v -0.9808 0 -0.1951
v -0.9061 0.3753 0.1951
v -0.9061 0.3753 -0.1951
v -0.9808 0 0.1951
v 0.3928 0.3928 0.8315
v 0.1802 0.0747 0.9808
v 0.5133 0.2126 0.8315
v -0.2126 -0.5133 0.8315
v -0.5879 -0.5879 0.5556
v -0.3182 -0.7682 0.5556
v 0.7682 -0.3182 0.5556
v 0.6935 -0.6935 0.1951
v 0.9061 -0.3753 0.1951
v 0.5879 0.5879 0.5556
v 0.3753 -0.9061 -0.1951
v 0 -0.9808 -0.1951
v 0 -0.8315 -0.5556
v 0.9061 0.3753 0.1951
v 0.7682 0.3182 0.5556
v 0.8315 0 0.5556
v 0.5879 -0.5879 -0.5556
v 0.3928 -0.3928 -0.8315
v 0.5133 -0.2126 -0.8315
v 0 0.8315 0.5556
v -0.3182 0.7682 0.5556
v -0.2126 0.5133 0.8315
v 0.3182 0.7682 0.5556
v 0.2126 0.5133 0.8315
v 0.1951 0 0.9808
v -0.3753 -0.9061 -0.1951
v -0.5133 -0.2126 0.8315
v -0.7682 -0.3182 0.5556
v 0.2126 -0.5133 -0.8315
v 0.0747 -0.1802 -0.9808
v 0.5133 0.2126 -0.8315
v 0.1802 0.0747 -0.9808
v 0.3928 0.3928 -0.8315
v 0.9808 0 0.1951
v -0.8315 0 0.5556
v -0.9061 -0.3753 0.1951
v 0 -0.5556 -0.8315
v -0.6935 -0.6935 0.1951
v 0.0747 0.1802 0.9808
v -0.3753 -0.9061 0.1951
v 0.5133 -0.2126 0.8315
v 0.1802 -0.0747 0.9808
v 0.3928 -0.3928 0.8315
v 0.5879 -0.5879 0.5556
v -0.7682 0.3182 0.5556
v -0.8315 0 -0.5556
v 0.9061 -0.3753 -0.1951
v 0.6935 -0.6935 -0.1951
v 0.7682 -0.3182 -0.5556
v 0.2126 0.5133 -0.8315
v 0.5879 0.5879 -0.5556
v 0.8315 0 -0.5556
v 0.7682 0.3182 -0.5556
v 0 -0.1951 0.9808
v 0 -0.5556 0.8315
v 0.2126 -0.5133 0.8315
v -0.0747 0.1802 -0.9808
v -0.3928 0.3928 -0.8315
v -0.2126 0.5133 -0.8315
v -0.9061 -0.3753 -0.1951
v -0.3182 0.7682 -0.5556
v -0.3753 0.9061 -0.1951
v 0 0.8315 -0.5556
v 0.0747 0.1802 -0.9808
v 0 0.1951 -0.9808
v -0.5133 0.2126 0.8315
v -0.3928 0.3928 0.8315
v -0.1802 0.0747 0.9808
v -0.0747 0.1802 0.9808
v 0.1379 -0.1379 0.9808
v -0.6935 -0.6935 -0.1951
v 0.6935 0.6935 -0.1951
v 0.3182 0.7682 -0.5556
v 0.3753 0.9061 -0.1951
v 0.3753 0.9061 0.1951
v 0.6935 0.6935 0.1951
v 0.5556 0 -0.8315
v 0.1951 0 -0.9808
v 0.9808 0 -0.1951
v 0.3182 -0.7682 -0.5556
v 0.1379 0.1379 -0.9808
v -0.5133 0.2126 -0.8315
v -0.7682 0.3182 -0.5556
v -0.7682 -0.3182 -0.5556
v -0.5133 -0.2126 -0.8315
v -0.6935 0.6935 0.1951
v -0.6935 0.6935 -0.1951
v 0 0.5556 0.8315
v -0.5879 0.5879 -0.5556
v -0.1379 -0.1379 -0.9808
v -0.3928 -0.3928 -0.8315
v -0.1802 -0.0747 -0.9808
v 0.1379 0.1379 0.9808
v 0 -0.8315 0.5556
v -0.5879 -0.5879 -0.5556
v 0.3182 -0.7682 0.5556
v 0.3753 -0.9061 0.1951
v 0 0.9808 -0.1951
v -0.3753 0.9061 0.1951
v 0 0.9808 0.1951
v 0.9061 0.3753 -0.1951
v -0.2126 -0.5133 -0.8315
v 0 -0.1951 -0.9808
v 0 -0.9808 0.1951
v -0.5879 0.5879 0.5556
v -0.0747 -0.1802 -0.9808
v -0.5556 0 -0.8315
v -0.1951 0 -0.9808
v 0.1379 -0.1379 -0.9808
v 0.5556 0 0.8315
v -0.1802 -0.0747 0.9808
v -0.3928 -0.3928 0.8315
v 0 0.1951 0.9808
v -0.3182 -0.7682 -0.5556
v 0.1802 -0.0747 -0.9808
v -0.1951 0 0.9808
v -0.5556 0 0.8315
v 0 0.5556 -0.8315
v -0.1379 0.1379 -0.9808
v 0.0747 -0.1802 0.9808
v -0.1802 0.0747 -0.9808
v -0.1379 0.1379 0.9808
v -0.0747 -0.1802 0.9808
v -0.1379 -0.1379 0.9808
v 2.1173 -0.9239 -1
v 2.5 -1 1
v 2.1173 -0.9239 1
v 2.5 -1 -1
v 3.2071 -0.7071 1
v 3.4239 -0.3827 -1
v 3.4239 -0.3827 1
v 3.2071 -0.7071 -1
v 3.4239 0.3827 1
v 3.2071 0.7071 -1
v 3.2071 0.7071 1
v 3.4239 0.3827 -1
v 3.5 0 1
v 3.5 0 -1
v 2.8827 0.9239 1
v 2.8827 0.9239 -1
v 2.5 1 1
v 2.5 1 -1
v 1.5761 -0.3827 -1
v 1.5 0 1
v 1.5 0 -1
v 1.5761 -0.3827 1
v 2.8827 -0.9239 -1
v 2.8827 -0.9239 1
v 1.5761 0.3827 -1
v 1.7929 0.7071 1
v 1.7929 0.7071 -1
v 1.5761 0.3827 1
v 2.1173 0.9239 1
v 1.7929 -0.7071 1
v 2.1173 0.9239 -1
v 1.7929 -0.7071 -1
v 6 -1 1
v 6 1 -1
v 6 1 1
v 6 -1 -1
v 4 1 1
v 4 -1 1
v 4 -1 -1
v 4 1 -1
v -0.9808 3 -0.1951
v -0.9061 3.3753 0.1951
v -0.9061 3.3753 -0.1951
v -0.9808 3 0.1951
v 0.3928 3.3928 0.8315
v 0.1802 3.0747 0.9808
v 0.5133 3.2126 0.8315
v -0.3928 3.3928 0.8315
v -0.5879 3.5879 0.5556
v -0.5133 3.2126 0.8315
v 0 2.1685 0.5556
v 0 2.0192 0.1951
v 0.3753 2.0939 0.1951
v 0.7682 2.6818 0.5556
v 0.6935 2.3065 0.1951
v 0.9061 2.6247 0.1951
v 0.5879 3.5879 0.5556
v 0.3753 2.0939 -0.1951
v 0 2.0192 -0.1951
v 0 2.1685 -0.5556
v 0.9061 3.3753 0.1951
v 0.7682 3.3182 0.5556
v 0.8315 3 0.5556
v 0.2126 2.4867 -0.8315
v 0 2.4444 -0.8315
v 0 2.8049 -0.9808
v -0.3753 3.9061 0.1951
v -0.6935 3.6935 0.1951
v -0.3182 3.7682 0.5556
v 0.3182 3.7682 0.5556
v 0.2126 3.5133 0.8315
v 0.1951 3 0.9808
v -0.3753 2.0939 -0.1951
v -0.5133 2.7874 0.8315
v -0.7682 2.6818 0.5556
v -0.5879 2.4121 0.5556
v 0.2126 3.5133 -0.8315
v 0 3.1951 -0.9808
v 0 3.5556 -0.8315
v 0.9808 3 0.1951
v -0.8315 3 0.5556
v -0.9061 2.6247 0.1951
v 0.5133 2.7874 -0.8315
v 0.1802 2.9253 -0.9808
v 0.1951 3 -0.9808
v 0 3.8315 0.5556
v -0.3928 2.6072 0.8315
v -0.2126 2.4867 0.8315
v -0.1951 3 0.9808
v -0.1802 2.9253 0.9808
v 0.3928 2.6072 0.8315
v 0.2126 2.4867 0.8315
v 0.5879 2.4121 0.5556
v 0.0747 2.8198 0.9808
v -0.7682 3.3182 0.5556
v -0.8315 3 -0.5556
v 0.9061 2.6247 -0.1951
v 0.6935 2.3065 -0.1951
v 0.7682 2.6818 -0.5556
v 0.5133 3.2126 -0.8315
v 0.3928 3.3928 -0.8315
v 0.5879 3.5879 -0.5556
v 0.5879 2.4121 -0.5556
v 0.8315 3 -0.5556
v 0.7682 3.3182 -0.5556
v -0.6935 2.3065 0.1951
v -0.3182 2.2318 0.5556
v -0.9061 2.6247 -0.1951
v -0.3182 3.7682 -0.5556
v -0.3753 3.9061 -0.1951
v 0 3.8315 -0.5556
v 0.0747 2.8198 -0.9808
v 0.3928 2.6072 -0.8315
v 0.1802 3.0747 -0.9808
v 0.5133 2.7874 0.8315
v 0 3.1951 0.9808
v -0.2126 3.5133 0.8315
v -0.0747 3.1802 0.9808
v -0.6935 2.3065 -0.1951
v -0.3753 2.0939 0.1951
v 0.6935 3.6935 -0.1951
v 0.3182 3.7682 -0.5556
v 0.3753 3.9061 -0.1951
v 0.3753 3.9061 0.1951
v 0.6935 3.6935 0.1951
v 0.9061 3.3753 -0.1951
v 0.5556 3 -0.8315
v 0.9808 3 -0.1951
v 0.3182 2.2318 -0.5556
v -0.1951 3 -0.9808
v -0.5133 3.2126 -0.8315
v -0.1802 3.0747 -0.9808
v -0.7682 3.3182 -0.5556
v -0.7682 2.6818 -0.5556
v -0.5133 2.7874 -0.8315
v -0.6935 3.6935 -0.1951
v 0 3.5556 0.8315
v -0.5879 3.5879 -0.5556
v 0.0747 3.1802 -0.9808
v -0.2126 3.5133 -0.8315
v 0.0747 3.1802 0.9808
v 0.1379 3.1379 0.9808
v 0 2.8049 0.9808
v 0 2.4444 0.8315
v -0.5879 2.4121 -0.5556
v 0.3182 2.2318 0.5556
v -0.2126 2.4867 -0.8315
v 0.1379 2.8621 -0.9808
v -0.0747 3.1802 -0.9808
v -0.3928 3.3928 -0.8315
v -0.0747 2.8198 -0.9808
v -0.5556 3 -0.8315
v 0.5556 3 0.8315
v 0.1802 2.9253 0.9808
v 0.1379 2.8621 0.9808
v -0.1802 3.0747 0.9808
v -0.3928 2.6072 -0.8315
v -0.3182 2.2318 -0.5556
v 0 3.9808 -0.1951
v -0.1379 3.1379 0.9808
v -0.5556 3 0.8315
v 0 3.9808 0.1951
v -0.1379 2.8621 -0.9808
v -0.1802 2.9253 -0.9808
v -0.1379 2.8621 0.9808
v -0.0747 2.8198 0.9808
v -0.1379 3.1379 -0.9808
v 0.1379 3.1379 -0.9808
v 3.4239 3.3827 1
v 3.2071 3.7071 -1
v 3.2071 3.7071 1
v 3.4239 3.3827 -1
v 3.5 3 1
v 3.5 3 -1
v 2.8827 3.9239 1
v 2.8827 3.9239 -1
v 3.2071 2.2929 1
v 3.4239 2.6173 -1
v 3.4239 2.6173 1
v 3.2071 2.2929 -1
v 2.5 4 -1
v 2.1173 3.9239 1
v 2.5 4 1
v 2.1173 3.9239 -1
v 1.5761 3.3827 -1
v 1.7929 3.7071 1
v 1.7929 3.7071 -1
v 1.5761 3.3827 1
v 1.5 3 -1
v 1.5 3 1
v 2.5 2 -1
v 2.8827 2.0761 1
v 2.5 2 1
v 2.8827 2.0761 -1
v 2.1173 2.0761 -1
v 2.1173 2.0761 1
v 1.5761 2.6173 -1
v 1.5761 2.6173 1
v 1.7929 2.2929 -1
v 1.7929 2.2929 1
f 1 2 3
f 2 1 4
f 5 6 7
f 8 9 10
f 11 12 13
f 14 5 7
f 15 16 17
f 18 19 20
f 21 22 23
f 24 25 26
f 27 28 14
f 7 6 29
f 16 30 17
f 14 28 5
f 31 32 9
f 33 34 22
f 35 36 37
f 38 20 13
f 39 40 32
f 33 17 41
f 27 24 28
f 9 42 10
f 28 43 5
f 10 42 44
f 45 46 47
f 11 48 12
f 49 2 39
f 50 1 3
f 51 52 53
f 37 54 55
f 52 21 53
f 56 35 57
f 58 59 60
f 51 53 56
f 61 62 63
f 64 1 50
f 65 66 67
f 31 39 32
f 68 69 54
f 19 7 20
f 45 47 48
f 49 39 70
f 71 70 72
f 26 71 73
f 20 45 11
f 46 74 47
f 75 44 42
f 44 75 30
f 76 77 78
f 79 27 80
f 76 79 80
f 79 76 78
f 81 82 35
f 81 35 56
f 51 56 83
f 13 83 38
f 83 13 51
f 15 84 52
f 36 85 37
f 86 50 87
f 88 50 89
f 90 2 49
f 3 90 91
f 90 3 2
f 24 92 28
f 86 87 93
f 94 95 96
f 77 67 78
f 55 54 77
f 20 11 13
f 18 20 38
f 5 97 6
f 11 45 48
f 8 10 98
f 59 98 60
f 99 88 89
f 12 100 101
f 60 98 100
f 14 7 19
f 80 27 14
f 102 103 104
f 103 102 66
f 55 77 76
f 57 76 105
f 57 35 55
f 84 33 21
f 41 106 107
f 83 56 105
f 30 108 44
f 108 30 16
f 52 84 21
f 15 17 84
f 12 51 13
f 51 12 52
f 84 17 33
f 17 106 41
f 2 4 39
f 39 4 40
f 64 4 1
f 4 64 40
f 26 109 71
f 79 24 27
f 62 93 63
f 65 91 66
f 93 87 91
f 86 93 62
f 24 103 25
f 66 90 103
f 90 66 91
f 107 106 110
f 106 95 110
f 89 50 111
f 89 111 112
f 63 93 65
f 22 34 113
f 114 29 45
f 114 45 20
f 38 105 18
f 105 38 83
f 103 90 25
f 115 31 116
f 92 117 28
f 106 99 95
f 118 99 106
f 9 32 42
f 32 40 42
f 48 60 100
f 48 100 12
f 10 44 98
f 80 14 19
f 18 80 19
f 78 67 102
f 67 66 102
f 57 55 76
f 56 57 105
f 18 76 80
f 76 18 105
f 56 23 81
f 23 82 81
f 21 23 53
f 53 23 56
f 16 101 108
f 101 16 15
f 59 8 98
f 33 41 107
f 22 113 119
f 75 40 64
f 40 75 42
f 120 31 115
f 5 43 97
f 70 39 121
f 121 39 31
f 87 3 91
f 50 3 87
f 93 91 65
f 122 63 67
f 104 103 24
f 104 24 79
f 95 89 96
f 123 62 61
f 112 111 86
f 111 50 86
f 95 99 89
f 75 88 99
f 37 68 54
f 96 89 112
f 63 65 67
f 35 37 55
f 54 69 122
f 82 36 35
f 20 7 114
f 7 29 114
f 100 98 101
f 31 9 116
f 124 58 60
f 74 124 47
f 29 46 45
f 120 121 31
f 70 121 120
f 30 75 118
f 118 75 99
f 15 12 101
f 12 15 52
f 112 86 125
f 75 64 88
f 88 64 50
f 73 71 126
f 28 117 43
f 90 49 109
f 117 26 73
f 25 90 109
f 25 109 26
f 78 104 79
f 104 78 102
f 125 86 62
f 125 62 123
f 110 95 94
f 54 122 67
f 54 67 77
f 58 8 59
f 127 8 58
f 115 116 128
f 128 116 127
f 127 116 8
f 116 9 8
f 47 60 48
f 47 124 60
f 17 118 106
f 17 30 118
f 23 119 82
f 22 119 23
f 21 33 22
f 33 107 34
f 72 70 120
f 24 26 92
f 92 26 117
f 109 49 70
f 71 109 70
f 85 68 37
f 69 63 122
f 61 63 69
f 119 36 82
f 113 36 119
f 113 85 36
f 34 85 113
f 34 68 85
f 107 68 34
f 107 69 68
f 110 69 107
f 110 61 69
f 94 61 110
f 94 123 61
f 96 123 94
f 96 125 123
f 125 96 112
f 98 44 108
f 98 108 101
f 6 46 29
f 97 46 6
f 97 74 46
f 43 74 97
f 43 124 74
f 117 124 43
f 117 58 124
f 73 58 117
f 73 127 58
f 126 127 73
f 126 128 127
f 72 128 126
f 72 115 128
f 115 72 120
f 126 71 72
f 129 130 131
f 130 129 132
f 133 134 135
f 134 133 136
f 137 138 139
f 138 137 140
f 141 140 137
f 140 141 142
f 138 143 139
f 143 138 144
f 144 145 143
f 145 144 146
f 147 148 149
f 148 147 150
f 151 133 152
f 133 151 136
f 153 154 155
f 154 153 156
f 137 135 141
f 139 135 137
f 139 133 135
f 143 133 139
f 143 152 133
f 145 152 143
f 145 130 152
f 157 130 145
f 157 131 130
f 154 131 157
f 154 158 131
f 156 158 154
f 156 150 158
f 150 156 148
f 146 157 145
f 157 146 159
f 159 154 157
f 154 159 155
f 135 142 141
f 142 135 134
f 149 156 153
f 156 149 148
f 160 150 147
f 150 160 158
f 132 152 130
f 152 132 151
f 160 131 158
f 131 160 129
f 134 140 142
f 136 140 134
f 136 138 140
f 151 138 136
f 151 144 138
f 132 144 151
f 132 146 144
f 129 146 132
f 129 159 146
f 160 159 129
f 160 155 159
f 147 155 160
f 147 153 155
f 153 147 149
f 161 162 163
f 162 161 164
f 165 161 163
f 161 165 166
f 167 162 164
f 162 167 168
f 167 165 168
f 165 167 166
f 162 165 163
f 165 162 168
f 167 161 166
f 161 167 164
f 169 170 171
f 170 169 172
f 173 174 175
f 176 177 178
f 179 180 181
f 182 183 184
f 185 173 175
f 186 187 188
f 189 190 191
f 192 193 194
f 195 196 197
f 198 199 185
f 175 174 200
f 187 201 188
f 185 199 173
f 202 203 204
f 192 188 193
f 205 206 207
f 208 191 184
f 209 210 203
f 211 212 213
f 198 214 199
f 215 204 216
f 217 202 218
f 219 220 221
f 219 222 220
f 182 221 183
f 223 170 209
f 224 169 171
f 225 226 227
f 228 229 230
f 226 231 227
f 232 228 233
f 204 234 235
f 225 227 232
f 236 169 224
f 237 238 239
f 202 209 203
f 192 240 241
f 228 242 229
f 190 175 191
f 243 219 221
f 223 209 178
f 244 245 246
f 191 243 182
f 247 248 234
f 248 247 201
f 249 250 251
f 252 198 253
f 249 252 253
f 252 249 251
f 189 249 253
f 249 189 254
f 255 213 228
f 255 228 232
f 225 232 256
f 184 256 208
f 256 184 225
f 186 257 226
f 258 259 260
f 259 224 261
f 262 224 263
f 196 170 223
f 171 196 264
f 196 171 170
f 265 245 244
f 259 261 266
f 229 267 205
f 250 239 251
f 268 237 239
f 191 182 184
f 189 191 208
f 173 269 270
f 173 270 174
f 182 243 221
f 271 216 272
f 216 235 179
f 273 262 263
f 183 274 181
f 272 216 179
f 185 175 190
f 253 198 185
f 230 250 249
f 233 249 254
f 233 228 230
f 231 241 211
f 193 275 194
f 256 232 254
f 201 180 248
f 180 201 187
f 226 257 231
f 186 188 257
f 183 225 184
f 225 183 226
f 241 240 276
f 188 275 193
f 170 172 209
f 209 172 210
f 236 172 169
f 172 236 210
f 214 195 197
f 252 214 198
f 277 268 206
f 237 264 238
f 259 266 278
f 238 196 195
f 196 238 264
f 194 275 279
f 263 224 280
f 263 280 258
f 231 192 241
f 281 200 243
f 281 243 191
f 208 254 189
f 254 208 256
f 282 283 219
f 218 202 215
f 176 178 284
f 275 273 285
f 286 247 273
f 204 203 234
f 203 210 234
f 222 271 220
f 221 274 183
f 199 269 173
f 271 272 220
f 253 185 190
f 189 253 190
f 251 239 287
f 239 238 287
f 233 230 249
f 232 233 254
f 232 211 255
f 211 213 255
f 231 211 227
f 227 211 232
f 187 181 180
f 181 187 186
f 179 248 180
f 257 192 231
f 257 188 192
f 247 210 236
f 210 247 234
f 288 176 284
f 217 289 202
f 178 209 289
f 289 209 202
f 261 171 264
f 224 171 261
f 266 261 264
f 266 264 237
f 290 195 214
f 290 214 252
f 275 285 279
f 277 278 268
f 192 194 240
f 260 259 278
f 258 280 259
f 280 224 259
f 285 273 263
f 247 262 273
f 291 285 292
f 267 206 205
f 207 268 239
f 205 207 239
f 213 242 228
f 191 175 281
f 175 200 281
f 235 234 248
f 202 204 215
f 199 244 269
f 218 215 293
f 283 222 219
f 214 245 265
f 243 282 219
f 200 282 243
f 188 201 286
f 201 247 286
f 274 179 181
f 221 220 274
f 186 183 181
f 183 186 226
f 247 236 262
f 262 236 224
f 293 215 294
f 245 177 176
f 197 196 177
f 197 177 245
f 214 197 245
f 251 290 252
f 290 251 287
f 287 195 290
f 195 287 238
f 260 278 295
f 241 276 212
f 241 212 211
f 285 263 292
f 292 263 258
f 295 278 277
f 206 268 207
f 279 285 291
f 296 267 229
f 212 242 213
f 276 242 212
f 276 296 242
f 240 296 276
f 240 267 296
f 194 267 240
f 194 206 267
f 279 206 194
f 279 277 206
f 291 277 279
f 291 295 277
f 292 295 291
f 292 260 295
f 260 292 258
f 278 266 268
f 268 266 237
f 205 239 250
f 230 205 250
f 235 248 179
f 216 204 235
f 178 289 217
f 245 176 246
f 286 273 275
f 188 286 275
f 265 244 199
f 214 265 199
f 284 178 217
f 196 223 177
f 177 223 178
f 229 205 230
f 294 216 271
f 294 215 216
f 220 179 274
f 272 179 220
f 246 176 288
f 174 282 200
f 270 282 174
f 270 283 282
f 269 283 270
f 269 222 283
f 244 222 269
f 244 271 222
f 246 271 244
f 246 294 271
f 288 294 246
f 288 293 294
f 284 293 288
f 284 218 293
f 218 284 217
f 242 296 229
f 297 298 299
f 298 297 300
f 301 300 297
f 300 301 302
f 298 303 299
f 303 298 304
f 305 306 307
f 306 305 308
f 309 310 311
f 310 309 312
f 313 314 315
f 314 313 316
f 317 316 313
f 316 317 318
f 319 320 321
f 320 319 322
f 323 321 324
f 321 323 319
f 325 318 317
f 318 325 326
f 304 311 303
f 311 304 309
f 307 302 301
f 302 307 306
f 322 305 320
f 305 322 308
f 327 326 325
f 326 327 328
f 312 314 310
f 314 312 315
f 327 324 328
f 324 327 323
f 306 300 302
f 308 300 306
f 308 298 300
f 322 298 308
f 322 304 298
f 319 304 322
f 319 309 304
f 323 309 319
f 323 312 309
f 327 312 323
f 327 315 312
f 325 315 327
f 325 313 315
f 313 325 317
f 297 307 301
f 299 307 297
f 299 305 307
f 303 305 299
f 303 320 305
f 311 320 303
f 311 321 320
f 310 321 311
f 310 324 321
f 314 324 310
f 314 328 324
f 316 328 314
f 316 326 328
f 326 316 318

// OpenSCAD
$fn=16;

module parent() {
  for (i=[0:2]) {
    translate([2.5*i,0,0]) child(i);
  }
}

// Normal
parent() {
  sphere();
  cylinder(h=2, center=true);
  cube(2, center=true);
}

// No children
parent();

// Too few children
translate([0,3,0]) parent() { sphere(); }

// No parameter to child
module parent2() {
  child();
}

translate([2.5,3,0]) parent2() { cylinder(h=2, center=true); sphere(); }

// Negative parameter to child
module parent3() {
  child(-1);
}

translate([5,3,0]) parent3() { cube(); sphere(); }
